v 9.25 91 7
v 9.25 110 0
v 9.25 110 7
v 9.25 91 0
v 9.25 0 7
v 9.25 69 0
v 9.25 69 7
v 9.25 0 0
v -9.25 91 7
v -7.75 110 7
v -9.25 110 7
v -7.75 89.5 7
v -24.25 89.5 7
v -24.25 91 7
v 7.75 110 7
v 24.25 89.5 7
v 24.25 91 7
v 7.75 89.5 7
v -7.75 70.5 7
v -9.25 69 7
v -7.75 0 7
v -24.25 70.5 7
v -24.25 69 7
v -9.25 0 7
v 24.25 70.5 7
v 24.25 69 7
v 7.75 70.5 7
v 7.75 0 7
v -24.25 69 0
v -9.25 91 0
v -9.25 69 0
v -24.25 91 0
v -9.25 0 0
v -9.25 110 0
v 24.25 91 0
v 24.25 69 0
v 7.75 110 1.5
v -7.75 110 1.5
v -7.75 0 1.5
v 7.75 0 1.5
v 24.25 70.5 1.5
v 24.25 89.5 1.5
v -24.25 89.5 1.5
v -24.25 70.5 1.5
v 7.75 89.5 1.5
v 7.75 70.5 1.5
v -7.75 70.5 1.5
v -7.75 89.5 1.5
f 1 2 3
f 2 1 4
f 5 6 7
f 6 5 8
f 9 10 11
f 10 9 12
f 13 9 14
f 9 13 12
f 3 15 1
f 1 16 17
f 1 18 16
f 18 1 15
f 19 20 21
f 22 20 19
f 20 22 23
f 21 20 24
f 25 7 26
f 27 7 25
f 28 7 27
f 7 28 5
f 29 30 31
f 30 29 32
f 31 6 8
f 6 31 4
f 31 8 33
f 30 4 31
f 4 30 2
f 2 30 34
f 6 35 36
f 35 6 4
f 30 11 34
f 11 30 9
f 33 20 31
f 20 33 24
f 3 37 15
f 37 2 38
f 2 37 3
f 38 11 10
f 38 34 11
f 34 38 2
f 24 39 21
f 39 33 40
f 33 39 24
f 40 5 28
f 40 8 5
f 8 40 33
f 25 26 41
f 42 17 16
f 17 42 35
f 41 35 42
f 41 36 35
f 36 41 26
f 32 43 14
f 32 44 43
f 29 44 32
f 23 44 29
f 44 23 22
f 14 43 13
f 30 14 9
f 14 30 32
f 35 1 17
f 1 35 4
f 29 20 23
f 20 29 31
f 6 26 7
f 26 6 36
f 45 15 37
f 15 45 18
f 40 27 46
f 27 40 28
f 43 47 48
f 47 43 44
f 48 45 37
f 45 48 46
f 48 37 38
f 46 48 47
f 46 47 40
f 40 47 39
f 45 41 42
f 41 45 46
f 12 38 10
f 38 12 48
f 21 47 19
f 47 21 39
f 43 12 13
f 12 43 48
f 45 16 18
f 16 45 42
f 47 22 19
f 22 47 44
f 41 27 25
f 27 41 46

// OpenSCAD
/**
 * lateral.scad
 * 
 * Creado por Diego Viejo
 * 24 de abril de 2020
 * 
 * Creando laterales para aumentar la capacidad de nuestro huerto urbano. Mejores y más ricas
 * hortalizas en camino :p
 * 
 */

length = 250;
width = 95;
height = 15;
wall = 2;

muescaPos = 180;  //desde la derecha
muescaLength = 20;
muescaWidth = 25;

sujeccion();

//lateral();


module sujeccion()
difference()
{
    union()
    {
        translate([-(15.5+3)/2, 0, 0]) cube([15.5+3, 110, 7]);
        translate([-(30+15.5+3)/2, 70.5-3/2, 0]) cube([30+15.5+3, 19+3, 7]);
    }
        translate([-15.5/2, -1, 1.5]) cube([15.5, 110+2, 6]);
        translate([-(30+15.5+3)/2-1, 70.5, 1.5]) cube([30+15.5+3+2, 19, 6]);
}

module lateral()
difference()
{
    cube([length, width, height]);
    
    //muesca 
    translate([length-muescaPos-muescaLength, -1, -1]) cube([muescaLength, muescaWidth+1, height+2]);
    translate([length-muescaPos-muescaLength, width-muescaWidth, -1]) cube([muescaLength, muescaWidth+1, height+2]);
    
    //operación bikini
    hull()
    {
        translate([12, muescaWidth+12, wall]) cylinder(d=6, h=1);
        translate([12, width- (muescaWidth+12), wall]) cylinder(d=6, h=1);
        translate([length-12, muescaWidth+12, wall]) cylinder(d=6, h=1);
        translate([length-12, width- (muescaWidth+12), wall]) cylinder(d=6, h=1);

        translate([6, muescaWidth+6, height]) cylinder(d=6, h=30);
        translate([6, width- (muescaWidth+6), height]) cylinder(d=6, h=30);
        translate([length-6, muescaWidth+6, height]) cylinder(d=6, h=30);
        translate([length-6, width- (muescaWidth+6), height]) cylinder(d=6, h=30);
    }
    hull()
    {
        translate([12, 12, wall]) cylinder(d=6, h=1);
        translate([12, width-12, wall]) cylinder(d=6, h=1);
        translate([length-muescaPos-muescaLength-12, 12, wall]) cylinder(d=6, h=1);
        translate([length-muescaPos-muescaLength-12, width-12, wall]) cylinder(d=6, h=1);

        translate([6, 6, height]) cylinder(d=6, h=30);
        translate([6, width-6, height]) cylinder(d=6, h=30);
        translate([length-muescaPos-muescaLength-6, 6, height]) cylinder(d=6, h=30);
        translate([length-muescaPos-muescaLength-6, width-6, height]) cylinder(d=6, h=30);
    }
    hull()
    {
        translate([length-12, 12, wall]) cylinder(d=6, h=1);
        translate([length-12, width- 12, wall]) cylinder(d=6, h=1);
        translate([length-muescaPos+12, 12, wall]) cylinder(d=6, h=1);
        translate([length-muescaPos+12, width-12, wall]) cylinder(d=6, h=1);

        translate([length-6, 6, height]) cylinder(d=6, h=30);
        translate([length-6, width-6, height]) cylinder(d=6, h=30);
        translate([length-muescaPos+6, 6, height]) cylinder(d=6, h=30);
        translate([length-muescaPos+6, width-6, height]) cylinder(d=6, h=30);
    }
}
